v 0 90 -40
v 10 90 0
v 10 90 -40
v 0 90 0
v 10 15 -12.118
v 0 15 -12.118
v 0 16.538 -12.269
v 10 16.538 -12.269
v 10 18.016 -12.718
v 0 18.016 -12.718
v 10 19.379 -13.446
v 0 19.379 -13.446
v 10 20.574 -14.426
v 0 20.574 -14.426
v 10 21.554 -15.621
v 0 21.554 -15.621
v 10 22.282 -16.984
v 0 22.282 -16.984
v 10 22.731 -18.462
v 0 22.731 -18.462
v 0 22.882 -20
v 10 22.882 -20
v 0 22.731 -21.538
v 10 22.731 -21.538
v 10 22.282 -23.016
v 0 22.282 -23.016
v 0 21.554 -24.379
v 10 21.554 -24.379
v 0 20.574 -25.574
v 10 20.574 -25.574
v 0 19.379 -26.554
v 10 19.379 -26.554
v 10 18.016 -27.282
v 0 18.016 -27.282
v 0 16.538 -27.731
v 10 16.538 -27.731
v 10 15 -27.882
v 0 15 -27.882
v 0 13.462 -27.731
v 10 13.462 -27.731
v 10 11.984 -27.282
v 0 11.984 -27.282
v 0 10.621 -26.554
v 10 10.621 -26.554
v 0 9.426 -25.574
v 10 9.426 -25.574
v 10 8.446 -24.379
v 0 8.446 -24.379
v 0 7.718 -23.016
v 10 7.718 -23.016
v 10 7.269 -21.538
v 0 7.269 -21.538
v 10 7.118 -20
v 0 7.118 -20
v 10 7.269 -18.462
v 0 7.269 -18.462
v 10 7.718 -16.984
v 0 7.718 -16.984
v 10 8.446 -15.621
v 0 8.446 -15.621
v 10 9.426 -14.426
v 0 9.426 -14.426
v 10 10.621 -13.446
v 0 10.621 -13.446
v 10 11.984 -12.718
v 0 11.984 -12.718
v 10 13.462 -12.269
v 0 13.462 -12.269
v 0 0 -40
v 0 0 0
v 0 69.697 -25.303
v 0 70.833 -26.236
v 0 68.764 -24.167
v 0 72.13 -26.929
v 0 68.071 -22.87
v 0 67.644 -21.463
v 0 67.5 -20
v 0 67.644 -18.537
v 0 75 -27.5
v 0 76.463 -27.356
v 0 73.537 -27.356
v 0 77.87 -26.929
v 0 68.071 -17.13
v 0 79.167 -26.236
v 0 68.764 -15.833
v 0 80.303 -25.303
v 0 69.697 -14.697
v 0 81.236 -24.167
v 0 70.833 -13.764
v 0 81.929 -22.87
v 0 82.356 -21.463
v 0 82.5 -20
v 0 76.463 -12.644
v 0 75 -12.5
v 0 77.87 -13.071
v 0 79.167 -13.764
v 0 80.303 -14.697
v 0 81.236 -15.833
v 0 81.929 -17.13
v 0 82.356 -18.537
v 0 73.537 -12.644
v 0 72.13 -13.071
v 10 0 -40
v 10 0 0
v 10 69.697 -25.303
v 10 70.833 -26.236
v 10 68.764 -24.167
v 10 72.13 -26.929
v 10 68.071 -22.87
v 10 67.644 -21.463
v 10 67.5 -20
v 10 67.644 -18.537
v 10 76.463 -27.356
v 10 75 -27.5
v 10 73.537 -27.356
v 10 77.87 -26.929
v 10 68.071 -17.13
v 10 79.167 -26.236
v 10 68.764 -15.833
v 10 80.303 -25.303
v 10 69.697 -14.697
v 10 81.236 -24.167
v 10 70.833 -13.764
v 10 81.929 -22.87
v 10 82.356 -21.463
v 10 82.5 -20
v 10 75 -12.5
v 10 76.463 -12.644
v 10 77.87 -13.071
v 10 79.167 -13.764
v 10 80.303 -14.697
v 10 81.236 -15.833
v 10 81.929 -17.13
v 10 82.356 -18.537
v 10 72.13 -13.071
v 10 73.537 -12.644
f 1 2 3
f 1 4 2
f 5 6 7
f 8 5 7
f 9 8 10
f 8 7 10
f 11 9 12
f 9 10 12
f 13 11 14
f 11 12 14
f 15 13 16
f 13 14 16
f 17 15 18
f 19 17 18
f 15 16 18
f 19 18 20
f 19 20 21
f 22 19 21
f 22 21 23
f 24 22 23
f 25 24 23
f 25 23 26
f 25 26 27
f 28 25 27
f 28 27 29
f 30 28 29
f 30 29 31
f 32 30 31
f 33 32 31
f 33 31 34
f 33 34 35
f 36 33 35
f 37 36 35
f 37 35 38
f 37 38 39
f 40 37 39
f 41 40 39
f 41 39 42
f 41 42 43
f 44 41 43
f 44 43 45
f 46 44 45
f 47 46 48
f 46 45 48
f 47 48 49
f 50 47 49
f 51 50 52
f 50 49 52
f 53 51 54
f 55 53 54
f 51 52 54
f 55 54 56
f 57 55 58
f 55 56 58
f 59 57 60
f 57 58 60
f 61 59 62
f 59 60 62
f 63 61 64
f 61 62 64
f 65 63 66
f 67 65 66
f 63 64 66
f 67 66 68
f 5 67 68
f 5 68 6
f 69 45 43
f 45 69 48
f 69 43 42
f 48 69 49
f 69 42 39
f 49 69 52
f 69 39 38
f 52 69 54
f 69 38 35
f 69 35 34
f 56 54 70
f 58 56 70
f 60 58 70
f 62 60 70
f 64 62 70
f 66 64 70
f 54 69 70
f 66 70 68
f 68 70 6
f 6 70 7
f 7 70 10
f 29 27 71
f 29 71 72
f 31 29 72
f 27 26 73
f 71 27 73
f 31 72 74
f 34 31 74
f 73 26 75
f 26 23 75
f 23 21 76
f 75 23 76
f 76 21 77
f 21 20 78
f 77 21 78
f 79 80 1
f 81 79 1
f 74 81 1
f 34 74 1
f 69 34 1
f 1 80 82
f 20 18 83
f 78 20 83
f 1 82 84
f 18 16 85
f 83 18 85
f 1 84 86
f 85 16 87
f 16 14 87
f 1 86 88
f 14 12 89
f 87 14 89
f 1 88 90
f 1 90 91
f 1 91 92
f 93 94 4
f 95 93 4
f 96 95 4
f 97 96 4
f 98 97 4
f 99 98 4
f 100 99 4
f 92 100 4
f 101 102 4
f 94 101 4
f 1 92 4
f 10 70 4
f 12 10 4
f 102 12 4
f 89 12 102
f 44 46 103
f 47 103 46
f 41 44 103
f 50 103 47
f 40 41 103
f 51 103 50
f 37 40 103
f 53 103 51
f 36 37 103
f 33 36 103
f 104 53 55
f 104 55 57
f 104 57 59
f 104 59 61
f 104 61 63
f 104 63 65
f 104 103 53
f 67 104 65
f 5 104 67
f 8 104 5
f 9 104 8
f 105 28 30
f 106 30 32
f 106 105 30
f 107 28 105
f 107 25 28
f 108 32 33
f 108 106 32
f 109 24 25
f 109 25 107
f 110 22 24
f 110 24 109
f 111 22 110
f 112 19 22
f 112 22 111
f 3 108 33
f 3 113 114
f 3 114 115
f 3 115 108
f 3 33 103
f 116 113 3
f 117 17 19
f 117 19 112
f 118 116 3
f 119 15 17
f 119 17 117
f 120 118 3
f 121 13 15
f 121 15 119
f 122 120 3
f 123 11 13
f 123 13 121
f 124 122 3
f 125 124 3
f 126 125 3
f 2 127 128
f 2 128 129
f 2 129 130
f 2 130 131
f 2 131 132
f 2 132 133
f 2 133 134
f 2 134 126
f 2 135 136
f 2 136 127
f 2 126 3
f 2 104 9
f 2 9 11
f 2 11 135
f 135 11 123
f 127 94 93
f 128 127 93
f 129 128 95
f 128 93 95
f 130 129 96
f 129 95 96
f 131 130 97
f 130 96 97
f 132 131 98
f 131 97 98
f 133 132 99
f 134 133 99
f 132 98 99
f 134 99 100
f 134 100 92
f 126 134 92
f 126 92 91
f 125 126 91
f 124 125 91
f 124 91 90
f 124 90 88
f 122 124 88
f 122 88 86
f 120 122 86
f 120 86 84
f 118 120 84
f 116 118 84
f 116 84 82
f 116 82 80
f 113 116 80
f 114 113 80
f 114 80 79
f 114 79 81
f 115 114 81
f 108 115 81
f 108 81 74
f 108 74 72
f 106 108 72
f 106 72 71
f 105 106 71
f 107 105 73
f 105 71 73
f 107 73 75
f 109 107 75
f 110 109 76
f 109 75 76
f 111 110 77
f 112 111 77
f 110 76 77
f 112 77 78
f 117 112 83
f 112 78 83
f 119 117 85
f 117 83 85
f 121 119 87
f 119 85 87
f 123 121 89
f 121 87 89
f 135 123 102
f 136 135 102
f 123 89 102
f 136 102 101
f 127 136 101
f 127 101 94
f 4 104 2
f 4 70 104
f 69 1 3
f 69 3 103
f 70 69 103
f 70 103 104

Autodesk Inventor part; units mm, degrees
ref_plane "YZ Plane" through (0, 0, 0) normal (1, 0, 0) x (0, 1, 0)
ref_plane "XZ Plane" through (0, 0, 0) normal (0, 1, 0) x (-1, 0, 0)
ref_plane "XY Plane" through (0, 0, 0) normal (0, 0, 1) x (1, 0, 0)
sketch "Sketch1" plane through (0, 0, 0) normal (1, 0, 0) x (0, 1, 0)
  line L0 (0, 0) -> (90, 0)
  line L1 (90, 0) -> (90, -40)
  line L2 (90, -40) -> (0, -40)
  line L3 (0, -40) -> (0, 0)
  dimension "d0" = 90
  dimension "d1" = 40
extrude "Extrusion1" add sketch "Sketch1" along normal blind 10
sketch "Sketch2" plane through (0, 0, 0) normal (-1, 0, 0) x (0, 0, 1)
  circle A0 centre (-20, 15) radius 7.8823
  line L0 (0, 0) -> (-40, 0) projected
  dimension "d4" = 15
extrude "Extrusion2" cut sketch "Sketch2" against normal mid plane 50
sketch "Sketch3" plane through (0, 0, 0) normal (-1, 0, 0) x (0, 0, 1)
  circle A0 centre (-20, 75) radius 7.5
  line L0 (-40, 90) -> (0, 90) projected
  point P0 (0, 0)
  dimension "d7" = 15
  dimension "d8" = 15
extrude "Extrusion3" cut sketch "Sketch3" against normal mid plane 50
properties part number "holder"
